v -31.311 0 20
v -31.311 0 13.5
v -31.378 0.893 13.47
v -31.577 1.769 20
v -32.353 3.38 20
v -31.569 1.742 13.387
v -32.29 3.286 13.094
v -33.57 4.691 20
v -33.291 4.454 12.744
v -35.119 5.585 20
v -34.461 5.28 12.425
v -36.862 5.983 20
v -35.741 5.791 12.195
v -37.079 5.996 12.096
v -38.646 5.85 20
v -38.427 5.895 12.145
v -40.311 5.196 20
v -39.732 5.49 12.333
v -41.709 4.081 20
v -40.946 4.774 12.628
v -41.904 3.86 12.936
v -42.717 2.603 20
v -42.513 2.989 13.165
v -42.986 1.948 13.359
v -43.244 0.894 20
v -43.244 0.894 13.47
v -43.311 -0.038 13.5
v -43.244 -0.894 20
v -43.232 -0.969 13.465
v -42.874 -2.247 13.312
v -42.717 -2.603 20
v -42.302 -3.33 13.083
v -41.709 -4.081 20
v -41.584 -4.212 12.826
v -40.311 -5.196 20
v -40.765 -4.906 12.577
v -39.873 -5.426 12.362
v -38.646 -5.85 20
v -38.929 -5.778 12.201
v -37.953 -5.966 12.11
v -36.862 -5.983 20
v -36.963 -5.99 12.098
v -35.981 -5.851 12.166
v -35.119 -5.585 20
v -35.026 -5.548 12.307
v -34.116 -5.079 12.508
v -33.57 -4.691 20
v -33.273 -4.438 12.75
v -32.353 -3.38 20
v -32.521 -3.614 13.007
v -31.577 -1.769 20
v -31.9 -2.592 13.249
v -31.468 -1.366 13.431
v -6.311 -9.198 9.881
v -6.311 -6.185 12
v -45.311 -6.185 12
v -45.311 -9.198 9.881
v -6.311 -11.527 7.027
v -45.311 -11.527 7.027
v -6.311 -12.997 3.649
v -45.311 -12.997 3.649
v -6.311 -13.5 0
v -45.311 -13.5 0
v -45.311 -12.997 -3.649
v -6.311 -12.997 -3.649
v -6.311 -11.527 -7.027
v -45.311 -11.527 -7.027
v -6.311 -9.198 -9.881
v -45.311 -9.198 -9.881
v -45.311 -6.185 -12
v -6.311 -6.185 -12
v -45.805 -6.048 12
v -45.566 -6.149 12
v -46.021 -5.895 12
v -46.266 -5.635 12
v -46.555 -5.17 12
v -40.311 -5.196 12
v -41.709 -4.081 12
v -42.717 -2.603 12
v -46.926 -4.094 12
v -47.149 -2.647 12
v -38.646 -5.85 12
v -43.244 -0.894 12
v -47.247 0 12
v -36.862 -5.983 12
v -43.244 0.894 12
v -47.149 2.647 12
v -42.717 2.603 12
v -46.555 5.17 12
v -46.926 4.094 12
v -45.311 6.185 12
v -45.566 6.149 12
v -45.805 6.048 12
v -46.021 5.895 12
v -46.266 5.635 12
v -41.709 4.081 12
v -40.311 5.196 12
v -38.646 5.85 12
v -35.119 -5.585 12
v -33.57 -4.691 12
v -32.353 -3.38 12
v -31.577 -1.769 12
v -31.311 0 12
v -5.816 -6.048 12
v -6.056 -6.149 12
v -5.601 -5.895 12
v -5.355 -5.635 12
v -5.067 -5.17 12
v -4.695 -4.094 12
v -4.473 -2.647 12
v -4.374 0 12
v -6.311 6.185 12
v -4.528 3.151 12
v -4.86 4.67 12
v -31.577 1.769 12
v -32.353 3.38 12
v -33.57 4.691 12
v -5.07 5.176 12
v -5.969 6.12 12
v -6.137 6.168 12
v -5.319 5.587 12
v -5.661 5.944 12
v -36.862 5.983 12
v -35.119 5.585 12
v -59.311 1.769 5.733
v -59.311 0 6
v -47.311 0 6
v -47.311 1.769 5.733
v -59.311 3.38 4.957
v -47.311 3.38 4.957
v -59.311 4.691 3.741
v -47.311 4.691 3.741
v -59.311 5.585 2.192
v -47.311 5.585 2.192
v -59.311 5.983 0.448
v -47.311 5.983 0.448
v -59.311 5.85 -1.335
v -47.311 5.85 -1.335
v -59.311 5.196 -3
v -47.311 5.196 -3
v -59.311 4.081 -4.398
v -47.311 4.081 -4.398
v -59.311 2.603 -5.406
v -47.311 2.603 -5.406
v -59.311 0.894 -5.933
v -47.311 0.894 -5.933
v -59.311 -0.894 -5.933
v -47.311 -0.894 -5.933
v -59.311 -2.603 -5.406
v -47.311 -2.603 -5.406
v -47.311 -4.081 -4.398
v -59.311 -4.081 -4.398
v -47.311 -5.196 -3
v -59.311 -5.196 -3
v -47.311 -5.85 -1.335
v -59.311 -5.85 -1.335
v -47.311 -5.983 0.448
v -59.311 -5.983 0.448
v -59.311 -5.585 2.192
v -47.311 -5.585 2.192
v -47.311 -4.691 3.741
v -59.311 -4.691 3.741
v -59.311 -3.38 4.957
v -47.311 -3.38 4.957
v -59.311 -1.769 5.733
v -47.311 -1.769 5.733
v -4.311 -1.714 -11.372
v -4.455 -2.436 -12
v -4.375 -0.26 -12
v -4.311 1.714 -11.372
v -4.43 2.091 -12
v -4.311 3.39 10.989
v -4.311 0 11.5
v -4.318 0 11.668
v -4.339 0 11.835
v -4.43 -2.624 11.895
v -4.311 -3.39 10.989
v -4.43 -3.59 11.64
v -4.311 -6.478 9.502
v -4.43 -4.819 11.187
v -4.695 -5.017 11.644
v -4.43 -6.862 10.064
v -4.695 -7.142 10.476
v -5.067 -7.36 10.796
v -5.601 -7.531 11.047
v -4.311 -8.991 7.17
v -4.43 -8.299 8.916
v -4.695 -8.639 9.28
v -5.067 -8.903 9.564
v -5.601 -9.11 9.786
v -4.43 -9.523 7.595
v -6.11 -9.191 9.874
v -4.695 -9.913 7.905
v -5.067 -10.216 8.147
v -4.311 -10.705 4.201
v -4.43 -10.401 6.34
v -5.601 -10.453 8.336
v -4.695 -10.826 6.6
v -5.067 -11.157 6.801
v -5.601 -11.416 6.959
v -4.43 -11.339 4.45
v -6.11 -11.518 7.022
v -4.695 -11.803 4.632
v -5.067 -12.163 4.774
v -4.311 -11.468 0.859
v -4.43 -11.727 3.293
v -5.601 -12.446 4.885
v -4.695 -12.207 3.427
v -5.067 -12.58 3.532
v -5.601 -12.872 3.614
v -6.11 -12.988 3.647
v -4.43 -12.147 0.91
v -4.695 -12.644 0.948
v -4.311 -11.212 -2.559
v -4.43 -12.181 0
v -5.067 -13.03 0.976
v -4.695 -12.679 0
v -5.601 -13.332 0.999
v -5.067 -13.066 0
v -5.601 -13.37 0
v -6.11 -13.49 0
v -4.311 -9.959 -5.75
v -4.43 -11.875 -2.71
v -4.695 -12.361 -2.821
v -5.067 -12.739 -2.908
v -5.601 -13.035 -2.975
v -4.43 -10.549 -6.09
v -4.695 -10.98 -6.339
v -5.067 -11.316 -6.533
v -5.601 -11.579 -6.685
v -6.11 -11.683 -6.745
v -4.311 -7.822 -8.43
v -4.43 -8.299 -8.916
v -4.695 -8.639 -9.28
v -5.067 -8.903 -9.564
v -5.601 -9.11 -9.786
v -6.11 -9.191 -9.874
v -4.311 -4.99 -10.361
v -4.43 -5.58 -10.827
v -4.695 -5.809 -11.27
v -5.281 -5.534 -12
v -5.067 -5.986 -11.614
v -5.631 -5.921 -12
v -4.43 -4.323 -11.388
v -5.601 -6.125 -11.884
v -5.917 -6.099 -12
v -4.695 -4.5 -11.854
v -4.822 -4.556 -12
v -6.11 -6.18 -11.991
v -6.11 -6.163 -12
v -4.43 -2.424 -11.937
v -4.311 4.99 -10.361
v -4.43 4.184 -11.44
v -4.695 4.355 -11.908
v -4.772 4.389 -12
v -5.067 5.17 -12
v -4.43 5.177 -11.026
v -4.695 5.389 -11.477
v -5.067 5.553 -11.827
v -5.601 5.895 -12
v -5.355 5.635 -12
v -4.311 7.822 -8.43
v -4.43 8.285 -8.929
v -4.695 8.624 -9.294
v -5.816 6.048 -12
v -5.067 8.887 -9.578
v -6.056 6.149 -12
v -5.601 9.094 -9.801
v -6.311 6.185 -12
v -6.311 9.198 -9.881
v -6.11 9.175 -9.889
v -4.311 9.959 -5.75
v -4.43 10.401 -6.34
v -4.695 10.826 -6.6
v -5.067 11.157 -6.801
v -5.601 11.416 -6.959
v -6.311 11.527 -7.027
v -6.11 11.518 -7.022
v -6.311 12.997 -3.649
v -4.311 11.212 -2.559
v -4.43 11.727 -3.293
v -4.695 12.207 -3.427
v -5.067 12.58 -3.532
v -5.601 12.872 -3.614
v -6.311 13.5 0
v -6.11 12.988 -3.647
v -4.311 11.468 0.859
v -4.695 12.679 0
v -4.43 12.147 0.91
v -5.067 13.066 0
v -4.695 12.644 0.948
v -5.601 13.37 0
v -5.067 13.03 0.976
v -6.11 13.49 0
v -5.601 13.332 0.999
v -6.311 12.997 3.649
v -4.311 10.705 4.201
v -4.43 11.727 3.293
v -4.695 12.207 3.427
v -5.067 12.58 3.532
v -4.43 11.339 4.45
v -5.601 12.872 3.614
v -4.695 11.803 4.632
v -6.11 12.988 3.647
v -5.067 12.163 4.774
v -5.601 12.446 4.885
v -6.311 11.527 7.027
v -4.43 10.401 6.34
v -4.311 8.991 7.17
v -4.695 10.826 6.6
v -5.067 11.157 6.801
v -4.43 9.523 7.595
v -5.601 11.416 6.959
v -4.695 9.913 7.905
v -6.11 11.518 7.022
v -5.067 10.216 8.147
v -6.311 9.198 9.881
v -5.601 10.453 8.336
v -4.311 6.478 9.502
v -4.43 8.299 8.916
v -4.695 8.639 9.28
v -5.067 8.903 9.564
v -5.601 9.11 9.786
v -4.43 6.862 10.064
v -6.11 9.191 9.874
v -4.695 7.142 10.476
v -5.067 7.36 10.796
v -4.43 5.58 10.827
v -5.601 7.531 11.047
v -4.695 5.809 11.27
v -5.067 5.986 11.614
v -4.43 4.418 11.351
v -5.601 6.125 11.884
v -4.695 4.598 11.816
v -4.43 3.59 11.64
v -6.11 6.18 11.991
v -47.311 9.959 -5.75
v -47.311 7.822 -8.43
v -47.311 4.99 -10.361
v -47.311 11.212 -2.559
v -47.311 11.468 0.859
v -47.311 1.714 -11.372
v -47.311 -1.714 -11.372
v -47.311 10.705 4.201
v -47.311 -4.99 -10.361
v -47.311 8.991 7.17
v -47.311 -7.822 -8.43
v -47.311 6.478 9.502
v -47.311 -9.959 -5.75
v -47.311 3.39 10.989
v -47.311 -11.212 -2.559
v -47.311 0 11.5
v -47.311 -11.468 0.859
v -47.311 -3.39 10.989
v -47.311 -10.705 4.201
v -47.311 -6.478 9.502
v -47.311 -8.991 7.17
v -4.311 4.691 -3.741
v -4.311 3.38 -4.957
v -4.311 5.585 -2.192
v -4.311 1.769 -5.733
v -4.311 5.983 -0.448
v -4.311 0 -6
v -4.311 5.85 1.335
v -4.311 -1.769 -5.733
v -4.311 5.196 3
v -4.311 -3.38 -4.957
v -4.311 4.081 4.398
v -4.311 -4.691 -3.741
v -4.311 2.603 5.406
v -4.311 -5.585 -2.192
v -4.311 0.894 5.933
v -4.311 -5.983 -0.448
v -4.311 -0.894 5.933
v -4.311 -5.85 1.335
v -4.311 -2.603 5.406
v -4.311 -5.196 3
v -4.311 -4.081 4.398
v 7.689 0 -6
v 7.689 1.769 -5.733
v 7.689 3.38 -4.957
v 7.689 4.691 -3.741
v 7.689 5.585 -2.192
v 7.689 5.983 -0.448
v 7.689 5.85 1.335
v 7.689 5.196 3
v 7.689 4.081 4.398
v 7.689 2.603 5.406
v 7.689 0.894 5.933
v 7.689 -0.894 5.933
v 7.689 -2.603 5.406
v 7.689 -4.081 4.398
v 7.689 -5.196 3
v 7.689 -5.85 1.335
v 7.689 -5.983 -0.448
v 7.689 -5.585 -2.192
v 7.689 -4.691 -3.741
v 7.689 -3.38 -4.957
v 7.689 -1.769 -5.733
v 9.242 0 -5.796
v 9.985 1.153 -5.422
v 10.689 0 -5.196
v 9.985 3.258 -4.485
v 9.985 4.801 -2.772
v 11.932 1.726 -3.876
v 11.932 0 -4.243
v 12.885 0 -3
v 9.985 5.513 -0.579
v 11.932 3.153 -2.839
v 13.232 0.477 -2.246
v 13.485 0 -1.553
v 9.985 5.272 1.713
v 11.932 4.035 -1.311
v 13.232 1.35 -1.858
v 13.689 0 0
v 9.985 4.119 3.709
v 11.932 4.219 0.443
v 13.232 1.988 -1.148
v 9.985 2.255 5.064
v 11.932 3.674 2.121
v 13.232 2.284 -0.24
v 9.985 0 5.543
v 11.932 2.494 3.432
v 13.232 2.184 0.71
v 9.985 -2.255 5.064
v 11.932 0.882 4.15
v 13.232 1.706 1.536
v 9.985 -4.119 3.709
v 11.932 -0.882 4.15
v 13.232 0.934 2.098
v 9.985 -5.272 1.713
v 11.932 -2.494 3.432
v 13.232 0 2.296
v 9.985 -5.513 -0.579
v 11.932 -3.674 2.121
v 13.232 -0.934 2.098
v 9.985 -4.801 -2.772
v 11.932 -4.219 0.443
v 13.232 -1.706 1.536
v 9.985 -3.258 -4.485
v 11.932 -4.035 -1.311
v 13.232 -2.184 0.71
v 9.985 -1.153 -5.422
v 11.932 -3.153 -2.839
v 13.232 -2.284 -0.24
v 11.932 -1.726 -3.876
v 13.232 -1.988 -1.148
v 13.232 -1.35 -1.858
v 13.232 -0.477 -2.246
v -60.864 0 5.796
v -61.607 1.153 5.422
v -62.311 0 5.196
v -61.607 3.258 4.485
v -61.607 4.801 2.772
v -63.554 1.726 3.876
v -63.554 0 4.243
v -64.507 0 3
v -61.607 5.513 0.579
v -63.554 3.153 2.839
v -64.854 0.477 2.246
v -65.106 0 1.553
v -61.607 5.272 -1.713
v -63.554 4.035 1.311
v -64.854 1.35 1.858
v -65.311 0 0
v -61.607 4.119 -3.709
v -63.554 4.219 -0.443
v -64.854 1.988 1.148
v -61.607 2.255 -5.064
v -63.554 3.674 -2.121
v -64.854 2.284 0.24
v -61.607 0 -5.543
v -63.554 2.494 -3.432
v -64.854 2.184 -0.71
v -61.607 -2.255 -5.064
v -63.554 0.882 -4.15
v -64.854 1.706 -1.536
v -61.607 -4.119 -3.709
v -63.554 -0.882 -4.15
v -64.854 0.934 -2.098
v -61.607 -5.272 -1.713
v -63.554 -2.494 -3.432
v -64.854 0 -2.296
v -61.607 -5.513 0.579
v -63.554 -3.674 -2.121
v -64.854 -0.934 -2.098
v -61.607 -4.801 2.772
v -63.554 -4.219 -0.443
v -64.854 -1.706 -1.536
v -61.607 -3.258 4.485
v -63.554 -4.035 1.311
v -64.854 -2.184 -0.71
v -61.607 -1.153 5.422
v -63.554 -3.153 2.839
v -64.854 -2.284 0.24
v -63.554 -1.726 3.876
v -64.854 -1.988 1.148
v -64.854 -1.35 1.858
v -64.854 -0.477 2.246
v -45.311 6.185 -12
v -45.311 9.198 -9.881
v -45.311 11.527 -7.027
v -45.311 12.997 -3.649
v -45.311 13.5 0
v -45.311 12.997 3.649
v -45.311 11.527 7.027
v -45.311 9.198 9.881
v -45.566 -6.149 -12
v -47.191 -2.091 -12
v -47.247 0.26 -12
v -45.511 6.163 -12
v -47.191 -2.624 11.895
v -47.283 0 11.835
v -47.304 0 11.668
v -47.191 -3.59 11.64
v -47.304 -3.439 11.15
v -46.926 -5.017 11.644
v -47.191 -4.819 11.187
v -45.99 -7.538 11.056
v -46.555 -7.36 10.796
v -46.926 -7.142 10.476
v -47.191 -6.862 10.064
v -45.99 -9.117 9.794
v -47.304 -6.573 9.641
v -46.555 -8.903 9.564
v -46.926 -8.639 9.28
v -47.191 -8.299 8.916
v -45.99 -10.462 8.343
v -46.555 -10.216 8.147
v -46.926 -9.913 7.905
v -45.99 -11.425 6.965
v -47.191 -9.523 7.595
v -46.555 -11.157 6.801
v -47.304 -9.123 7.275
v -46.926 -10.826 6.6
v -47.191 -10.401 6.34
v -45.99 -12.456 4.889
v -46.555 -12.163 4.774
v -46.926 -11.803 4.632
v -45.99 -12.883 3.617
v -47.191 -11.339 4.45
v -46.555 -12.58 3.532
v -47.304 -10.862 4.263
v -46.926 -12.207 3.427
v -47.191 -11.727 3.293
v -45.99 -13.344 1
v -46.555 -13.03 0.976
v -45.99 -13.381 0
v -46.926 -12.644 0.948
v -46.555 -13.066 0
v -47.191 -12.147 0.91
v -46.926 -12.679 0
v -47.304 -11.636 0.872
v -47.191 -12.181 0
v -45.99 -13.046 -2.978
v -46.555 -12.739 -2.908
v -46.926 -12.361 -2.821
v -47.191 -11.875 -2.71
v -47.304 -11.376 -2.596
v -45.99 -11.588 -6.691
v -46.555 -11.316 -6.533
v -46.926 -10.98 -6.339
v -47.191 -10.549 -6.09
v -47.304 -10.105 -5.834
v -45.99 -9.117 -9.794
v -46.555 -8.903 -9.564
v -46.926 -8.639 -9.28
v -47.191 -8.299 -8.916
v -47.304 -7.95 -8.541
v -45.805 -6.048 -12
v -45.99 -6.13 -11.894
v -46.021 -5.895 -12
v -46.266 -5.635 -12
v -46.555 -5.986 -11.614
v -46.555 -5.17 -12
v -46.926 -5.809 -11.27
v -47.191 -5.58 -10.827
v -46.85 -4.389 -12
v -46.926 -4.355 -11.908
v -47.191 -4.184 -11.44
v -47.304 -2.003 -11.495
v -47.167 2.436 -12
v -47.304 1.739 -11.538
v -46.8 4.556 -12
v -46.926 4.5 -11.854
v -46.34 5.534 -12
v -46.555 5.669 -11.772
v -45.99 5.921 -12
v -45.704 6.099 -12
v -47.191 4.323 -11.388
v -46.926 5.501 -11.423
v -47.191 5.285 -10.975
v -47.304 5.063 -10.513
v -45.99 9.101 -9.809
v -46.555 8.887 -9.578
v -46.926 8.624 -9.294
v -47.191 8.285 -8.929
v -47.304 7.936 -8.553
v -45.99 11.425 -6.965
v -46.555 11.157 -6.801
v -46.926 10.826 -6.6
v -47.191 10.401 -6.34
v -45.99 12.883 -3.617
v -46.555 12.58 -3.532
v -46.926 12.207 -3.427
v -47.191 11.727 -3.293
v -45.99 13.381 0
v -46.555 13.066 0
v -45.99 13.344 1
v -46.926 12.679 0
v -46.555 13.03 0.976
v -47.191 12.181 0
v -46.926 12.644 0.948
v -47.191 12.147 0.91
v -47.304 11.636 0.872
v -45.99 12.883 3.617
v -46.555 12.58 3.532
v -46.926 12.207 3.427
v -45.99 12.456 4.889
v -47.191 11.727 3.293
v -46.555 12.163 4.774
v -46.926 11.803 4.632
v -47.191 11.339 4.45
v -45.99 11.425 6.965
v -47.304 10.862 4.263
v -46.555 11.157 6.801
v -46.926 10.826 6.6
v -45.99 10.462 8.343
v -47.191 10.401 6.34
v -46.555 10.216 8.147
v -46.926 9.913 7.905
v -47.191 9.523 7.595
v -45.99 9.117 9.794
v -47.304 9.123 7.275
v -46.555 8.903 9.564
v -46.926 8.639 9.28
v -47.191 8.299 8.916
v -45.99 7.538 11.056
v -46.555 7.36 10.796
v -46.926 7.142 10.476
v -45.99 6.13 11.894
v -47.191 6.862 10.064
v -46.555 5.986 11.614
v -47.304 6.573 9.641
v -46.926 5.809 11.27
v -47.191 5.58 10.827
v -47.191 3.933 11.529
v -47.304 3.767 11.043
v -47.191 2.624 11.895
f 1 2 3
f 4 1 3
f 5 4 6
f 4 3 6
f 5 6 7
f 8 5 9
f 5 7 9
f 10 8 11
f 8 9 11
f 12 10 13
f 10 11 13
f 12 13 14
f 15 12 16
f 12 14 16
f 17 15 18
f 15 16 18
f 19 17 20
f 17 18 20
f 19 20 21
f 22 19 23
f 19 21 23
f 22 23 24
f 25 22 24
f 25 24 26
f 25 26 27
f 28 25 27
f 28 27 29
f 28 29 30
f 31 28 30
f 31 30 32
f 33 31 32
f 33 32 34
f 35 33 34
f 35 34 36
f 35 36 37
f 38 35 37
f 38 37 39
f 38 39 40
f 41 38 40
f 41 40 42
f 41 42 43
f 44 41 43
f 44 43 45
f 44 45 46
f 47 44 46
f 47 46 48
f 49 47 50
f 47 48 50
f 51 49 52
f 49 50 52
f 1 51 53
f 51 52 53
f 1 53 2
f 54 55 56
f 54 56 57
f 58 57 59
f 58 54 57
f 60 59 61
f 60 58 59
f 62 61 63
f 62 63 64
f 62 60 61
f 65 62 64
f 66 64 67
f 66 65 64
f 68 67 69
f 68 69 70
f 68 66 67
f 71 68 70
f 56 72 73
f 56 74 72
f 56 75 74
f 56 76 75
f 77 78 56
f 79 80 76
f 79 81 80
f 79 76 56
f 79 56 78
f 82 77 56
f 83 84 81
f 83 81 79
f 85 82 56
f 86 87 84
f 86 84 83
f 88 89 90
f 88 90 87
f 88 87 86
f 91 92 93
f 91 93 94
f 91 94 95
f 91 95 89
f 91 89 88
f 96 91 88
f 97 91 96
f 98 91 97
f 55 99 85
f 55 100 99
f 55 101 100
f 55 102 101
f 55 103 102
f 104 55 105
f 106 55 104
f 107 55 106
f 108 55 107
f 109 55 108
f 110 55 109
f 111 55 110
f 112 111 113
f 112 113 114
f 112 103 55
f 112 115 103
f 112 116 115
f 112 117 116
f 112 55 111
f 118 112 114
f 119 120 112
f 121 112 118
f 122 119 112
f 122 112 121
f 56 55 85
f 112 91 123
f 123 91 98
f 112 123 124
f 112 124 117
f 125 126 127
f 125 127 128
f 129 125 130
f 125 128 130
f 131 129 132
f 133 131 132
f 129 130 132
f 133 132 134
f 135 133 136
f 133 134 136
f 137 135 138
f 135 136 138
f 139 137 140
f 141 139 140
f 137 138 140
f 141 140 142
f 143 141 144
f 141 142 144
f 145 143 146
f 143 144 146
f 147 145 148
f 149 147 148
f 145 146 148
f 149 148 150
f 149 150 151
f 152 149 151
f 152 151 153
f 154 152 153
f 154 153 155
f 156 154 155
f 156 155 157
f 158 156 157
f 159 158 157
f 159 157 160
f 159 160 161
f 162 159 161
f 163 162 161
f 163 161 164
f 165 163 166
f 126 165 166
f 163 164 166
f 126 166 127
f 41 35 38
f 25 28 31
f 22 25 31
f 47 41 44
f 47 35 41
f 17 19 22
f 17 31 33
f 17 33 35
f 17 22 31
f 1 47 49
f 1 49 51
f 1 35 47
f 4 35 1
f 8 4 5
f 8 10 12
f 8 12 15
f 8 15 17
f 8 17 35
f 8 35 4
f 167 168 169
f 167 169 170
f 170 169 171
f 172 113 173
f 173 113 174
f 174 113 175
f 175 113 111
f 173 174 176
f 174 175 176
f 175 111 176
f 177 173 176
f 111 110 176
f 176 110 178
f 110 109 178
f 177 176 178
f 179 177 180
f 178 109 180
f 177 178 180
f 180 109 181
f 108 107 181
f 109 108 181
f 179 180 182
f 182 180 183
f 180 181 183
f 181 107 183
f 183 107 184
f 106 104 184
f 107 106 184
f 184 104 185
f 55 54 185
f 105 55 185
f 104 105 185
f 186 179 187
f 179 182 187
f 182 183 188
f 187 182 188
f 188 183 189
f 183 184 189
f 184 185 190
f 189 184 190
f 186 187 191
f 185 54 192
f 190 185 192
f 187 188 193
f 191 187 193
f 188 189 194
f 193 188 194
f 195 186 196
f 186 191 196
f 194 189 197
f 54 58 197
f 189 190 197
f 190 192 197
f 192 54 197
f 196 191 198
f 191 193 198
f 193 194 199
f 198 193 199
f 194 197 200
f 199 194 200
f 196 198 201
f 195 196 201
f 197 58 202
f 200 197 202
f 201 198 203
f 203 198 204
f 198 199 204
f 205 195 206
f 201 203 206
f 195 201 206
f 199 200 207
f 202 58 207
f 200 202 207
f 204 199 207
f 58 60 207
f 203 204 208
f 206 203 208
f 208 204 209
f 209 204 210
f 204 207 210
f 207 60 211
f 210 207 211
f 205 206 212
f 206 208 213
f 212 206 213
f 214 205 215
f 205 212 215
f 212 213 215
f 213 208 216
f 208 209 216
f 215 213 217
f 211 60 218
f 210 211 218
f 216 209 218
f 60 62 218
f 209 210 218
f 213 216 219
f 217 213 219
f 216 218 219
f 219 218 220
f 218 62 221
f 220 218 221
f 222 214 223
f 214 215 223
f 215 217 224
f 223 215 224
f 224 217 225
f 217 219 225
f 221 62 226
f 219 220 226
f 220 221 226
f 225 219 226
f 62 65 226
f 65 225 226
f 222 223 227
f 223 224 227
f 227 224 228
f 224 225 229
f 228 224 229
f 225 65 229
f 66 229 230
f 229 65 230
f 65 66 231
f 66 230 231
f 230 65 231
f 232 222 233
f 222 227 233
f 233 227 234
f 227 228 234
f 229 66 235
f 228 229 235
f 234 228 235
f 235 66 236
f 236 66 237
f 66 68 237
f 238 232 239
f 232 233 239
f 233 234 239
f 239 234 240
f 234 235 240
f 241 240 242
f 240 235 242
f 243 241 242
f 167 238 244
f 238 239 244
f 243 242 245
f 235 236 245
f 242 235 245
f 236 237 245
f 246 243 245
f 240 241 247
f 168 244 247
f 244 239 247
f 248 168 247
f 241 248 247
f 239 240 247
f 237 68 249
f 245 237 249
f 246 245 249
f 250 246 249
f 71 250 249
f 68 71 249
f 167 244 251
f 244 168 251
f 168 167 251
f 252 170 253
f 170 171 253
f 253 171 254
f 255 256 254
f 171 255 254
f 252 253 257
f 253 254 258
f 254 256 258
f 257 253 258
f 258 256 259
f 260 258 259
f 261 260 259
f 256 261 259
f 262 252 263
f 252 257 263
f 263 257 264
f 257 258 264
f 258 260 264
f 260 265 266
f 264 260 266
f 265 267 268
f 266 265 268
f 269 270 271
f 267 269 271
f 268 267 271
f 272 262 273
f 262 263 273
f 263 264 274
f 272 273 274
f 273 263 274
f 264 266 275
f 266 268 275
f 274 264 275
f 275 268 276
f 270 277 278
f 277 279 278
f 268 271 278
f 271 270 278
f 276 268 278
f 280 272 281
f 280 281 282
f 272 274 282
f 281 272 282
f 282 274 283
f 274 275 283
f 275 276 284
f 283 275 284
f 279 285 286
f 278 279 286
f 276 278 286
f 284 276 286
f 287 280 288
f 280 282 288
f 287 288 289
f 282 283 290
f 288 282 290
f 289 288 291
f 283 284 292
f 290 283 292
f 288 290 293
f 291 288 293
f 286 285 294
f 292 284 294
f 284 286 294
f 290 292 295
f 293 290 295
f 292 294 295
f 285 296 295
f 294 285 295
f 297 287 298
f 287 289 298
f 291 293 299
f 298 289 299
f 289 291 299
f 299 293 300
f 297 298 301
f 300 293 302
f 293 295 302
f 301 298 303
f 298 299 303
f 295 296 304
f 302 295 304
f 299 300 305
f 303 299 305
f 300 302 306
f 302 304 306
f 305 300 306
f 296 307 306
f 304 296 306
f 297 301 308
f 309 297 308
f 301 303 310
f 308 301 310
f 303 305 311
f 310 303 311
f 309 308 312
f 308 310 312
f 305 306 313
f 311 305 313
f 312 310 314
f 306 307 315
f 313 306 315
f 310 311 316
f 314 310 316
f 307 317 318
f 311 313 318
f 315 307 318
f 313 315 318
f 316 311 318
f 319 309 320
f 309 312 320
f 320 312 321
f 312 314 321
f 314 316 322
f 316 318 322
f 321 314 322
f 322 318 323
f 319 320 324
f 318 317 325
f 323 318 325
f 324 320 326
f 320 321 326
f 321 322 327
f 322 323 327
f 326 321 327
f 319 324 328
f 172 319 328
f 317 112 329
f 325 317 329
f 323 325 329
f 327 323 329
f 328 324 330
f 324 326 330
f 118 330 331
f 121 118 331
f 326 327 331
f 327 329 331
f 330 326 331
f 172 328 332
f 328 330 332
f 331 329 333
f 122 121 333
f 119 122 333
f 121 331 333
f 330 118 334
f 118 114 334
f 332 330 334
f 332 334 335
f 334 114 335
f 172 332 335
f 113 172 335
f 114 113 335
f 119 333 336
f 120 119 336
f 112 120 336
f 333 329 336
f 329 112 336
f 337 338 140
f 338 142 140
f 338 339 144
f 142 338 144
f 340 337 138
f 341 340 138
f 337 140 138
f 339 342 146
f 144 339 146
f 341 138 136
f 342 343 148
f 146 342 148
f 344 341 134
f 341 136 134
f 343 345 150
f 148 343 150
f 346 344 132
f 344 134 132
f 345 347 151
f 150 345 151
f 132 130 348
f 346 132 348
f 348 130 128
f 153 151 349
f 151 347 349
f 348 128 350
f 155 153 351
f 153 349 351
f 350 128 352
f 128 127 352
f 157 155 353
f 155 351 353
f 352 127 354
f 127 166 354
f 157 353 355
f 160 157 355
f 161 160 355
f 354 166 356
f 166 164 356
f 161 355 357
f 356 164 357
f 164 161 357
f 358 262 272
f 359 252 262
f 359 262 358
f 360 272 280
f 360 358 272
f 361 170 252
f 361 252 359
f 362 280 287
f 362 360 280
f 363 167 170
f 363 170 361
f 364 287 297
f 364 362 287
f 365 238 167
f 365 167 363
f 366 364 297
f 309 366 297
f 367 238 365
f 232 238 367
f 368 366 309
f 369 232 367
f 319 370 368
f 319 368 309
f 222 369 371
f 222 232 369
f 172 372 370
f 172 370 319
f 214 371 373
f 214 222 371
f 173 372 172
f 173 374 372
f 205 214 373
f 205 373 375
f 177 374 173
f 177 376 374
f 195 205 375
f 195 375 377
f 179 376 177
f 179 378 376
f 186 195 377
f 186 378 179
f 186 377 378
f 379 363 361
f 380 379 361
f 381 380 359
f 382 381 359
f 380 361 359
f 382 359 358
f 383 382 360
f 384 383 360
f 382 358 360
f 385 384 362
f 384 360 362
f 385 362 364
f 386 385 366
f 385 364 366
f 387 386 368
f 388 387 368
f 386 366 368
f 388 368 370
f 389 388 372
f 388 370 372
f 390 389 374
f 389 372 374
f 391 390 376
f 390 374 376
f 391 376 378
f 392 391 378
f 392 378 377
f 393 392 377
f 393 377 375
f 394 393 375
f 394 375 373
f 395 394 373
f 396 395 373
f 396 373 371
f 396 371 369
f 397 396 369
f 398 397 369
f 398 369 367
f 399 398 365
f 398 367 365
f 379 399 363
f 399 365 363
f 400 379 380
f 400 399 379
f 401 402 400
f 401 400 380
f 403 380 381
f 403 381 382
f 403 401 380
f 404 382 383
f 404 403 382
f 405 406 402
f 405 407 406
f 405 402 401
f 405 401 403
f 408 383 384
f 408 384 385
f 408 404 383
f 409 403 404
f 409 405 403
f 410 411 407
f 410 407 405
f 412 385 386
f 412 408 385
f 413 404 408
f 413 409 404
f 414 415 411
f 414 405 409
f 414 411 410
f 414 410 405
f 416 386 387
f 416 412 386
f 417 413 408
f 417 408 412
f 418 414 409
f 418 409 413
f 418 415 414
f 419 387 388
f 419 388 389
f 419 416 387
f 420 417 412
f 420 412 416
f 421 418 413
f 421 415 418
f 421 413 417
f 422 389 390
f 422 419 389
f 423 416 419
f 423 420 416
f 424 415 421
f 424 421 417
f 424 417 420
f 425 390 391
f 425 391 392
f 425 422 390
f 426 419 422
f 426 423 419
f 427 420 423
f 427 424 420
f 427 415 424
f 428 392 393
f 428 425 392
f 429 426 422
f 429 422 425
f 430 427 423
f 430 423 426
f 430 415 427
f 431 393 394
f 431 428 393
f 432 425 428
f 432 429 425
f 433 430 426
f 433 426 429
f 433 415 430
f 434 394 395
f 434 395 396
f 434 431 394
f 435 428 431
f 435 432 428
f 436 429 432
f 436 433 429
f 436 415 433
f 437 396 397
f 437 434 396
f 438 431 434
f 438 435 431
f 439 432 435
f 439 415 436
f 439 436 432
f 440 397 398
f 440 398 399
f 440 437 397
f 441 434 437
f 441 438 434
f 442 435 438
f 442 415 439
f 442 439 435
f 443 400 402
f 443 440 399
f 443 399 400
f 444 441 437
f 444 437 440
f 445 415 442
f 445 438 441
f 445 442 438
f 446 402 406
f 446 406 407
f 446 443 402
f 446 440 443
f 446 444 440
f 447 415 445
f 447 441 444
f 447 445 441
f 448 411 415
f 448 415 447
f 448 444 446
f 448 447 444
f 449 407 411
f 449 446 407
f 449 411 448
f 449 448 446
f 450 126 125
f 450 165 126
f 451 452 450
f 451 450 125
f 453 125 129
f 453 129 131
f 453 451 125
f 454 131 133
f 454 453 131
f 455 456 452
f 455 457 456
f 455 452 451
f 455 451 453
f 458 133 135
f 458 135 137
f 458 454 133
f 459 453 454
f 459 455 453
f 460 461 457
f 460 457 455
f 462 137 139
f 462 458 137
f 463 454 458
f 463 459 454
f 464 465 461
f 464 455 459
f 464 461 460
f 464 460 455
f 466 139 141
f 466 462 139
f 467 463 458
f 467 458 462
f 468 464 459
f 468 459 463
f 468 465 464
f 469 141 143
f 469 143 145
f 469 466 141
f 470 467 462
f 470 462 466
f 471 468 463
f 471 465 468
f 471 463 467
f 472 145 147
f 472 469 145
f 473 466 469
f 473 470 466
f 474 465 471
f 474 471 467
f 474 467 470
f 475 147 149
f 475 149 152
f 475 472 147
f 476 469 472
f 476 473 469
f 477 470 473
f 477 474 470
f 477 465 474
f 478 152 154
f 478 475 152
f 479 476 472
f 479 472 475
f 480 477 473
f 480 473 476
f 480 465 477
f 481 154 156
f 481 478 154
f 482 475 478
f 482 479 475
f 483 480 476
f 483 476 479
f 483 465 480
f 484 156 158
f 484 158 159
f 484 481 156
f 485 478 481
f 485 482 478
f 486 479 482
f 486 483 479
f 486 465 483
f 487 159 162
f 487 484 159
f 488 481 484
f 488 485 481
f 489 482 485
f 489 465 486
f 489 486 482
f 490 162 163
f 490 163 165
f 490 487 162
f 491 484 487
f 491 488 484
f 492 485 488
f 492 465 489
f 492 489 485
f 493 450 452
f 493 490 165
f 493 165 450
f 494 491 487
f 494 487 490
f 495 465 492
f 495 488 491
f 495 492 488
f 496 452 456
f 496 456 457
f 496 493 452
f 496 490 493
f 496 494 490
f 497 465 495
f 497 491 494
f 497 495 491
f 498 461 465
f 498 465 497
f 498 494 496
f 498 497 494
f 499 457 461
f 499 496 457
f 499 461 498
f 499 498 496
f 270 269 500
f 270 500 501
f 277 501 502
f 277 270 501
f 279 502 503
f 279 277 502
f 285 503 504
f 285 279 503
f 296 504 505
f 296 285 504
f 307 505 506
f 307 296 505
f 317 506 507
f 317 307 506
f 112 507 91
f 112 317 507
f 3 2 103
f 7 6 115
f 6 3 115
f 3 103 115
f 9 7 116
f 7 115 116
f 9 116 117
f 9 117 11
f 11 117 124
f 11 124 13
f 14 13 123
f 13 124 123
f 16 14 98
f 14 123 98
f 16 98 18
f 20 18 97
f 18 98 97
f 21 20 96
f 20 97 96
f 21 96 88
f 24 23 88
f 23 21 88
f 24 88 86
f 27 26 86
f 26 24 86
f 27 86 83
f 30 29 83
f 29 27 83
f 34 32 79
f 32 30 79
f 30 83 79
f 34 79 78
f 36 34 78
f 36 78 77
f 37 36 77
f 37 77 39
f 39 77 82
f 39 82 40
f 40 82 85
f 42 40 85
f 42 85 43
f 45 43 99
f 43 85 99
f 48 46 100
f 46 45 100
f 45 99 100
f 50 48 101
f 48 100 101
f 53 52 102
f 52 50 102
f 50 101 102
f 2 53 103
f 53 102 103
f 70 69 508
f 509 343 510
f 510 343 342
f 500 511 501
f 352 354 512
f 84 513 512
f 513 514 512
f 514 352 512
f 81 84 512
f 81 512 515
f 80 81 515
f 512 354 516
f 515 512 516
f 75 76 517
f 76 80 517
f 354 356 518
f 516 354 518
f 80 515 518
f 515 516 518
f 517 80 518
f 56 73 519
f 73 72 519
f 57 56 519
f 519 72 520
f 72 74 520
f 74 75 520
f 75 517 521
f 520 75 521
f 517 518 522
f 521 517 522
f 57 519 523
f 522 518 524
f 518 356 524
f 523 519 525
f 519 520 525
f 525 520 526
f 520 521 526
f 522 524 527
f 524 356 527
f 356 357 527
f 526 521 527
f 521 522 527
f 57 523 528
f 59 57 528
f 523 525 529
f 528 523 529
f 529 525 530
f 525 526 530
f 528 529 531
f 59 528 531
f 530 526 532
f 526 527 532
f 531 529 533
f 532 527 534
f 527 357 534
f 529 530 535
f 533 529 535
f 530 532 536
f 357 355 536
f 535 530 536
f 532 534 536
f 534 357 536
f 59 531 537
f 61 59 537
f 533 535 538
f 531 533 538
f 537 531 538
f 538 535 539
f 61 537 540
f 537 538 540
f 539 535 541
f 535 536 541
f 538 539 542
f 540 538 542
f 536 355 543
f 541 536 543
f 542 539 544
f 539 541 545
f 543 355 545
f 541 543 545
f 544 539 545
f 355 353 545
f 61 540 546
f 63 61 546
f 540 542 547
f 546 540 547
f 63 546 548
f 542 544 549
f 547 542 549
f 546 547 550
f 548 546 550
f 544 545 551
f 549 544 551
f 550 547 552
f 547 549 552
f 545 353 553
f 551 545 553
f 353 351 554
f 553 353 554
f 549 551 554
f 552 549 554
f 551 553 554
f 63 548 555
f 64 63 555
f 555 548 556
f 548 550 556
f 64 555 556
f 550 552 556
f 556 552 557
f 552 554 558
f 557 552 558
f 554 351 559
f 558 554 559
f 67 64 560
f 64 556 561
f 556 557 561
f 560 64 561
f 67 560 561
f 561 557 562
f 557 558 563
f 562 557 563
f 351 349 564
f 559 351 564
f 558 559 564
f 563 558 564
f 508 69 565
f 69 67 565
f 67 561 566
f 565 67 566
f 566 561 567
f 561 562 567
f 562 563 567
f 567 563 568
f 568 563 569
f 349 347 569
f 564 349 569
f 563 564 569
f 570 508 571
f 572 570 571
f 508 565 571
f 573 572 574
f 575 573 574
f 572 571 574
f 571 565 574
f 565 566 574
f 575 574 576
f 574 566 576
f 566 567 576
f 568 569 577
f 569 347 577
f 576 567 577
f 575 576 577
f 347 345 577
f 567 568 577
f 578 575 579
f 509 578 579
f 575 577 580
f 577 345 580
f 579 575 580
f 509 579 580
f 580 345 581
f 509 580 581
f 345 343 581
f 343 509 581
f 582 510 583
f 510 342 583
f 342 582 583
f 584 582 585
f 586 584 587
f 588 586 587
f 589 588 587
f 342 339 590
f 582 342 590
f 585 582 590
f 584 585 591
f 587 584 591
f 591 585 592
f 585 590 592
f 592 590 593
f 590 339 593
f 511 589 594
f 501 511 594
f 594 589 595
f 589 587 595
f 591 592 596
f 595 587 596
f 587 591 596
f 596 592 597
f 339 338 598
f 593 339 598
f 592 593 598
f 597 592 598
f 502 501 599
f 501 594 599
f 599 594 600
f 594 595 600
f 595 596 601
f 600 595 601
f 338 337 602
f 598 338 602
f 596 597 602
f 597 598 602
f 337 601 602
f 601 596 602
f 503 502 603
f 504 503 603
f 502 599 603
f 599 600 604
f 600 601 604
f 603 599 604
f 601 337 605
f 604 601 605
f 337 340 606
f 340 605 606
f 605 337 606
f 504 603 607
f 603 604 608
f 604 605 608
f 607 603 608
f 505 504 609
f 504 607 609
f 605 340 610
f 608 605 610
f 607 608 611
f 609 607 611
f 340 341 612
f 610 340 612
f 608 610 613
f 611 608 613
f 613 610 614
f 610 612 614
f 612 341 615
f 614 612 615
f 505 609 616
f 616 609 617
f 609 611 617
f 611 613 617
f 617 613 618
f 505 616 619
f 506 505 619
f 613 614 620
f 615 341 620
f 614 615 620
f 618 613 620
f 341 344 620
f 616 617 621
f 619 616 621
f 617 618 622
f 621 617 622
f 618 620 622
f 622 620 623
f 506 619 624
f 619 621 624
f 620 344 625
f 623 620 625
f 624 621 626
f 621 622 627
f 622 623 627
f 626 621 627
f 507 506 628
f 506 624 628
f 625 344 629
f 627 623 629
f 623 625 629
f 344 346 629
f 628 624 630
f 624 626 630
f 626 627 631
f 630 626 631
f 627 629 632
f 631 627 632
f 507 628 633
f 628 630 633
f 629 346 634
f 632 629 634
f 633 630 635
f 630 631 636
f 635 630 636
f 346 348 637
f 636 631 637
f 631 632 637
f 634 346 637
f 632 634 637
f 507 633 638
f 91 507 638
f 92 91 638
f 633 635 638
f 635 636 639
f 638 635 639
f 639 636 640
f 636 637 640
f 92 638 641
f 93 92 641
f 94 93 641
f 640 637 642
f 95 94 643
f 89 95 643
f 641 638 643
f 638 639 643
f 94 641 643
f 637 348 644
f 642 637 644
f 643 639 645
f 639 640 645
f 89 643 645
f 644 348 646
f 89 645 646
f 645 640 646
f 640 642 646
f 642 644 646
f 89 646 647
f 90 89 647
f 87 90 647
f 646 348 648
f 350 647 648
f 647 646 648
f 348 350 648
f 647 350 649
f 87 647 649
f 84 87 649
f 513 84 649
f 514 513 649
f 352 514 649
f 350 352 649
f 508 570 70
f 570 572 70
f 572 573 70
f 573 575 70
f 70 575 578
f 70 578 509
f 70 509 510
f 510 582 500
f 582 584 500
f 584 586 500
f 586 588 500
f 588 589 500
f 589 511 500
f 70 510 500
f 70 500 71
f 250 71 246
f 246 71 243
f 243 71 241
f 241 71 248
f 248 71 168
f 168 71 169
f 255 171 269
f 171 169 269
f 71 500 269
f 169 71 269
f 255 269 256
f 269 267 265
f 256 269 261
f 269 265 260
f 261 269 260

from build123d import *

# Parameters (mm, degrees)
SKETCH1_W           = 43
SKETCH1_H           = 13.5
SKETCH4_R           = 6
BOSS_EXTRUDE2_DEPTH = 20
SKETCH5_R           = 6
BOSS_EXTRUDE3_DEPTH = 18
FILLET1_R           = 6
BOSS_EXTRUDE4_START = 18
SKETCH6_R           = 6
BOSS_EXTRUDE4_DEPTH = 18
FILLET2_R           = 6
FILLET3_R           = 2
SKETCH8_W           = 43
SKETCH8_H           = 23
CUT_EXTRUDE2_DEPTH  = 7
SKETCH9_W           = 43
SKETCH9_H           = 23
SKETCH9_R           = 6
CUT_EXTRUDE3_DEPTH  = 5


with BuildPart() as part:
    # Sketch1 → Revolve1 (revolve)
    with BuildSketch(Plane(origin=(0, 0, 0), x_dir=(1, 0, 0), z_dir=(0, 1, 0))):
        with Locations((-25.810870043, -6.75)):
            Rectangle(SKETCH1_W, SKETCH1_H)
    revolve(axis=Axis((-47.310870043, 0, 0), (1, 0, 0)))

    # Sketch4 → Boss-Extrude2 (add)
    with BuildSketch(Plane.XY):
        with Locations((-37.310870043, 0)):
            Circle(SKETCH4_R)
    extrude(amount=BOSS_EXTRUDE2_DEPTH)

    # Sketch5 → Boss-Extrude3 (add)
    with BuildSketch(Plane.ZY.offset(47.310870043)):
        Circle(SKETCH5_R)
    extrude(amount=BOSS_EXTRUDE3_DEPTH)

    # Fillet1
    fillet1_edges = [part.edges().sort_by_distance(p)[0] for p in [
        (-65.310870043, 0, -6),
    ]]
    fillet(fillet1_edges, radius=FILLET1_R)

    # Sketch6 → Boss-Extrude4 (add)
    with BuildSketch(Plane(origin=(-4.310870043, 0, 0), x_dir=(0, 0, -1), z_dir=(1, 0, 0)).offset(BOSS_EXTRUDE4_START)):
        Circle(SKETCH6_R)
    extrude(amount=-BOSS_EXTRUDE4_DEPTH)

    # Fillet2
    fillet2_edges = [part.edges().sort_by_distance(p)[0] for p in [
        (13.689129957, 0, 6),
    ]]
    fillet(fillet2_edges, radius=FILLET2_R)

    # Fillet3
    fillet3_edges = [part.edges().sort_by_distance(p)[0] for p in [
        (-4.310870043, 0, -13.5),
        (-47.310870043, 0, -13.5),
    ]]
    fillet(fillet3_edges, radius=FILLET3_R)

    # Sketch8 → Cut-Extrude2 (cut)
    with BuildSketch(Plane.XY.offset(-12)):
        with Locations((-25.810870043, 0)):
            Rectangle(SKETCH8_W, SKETCH8_H)
    extrude(amount=-CUT_EXTRUDE2_DEPTH, mode=Mode.SUBTRACT)

    # Sketch9 → Cut-Extrude3 (cut)
    with BuildSketch(Plane.XY.offset(12)):
        with Locations((-25.810870043, 0)):
            Rectangle(SKETCH9_W, SKETCH9_H)
        with Locations((-37.310870043, 0)):
            Circle(SKETCH9_R, mode=Mode.SUBTRACT)
    extrude(amount=CUT_EXTRUDE3_DEPTH, mode=Mode.SUBTRACT)


solid = part.part
